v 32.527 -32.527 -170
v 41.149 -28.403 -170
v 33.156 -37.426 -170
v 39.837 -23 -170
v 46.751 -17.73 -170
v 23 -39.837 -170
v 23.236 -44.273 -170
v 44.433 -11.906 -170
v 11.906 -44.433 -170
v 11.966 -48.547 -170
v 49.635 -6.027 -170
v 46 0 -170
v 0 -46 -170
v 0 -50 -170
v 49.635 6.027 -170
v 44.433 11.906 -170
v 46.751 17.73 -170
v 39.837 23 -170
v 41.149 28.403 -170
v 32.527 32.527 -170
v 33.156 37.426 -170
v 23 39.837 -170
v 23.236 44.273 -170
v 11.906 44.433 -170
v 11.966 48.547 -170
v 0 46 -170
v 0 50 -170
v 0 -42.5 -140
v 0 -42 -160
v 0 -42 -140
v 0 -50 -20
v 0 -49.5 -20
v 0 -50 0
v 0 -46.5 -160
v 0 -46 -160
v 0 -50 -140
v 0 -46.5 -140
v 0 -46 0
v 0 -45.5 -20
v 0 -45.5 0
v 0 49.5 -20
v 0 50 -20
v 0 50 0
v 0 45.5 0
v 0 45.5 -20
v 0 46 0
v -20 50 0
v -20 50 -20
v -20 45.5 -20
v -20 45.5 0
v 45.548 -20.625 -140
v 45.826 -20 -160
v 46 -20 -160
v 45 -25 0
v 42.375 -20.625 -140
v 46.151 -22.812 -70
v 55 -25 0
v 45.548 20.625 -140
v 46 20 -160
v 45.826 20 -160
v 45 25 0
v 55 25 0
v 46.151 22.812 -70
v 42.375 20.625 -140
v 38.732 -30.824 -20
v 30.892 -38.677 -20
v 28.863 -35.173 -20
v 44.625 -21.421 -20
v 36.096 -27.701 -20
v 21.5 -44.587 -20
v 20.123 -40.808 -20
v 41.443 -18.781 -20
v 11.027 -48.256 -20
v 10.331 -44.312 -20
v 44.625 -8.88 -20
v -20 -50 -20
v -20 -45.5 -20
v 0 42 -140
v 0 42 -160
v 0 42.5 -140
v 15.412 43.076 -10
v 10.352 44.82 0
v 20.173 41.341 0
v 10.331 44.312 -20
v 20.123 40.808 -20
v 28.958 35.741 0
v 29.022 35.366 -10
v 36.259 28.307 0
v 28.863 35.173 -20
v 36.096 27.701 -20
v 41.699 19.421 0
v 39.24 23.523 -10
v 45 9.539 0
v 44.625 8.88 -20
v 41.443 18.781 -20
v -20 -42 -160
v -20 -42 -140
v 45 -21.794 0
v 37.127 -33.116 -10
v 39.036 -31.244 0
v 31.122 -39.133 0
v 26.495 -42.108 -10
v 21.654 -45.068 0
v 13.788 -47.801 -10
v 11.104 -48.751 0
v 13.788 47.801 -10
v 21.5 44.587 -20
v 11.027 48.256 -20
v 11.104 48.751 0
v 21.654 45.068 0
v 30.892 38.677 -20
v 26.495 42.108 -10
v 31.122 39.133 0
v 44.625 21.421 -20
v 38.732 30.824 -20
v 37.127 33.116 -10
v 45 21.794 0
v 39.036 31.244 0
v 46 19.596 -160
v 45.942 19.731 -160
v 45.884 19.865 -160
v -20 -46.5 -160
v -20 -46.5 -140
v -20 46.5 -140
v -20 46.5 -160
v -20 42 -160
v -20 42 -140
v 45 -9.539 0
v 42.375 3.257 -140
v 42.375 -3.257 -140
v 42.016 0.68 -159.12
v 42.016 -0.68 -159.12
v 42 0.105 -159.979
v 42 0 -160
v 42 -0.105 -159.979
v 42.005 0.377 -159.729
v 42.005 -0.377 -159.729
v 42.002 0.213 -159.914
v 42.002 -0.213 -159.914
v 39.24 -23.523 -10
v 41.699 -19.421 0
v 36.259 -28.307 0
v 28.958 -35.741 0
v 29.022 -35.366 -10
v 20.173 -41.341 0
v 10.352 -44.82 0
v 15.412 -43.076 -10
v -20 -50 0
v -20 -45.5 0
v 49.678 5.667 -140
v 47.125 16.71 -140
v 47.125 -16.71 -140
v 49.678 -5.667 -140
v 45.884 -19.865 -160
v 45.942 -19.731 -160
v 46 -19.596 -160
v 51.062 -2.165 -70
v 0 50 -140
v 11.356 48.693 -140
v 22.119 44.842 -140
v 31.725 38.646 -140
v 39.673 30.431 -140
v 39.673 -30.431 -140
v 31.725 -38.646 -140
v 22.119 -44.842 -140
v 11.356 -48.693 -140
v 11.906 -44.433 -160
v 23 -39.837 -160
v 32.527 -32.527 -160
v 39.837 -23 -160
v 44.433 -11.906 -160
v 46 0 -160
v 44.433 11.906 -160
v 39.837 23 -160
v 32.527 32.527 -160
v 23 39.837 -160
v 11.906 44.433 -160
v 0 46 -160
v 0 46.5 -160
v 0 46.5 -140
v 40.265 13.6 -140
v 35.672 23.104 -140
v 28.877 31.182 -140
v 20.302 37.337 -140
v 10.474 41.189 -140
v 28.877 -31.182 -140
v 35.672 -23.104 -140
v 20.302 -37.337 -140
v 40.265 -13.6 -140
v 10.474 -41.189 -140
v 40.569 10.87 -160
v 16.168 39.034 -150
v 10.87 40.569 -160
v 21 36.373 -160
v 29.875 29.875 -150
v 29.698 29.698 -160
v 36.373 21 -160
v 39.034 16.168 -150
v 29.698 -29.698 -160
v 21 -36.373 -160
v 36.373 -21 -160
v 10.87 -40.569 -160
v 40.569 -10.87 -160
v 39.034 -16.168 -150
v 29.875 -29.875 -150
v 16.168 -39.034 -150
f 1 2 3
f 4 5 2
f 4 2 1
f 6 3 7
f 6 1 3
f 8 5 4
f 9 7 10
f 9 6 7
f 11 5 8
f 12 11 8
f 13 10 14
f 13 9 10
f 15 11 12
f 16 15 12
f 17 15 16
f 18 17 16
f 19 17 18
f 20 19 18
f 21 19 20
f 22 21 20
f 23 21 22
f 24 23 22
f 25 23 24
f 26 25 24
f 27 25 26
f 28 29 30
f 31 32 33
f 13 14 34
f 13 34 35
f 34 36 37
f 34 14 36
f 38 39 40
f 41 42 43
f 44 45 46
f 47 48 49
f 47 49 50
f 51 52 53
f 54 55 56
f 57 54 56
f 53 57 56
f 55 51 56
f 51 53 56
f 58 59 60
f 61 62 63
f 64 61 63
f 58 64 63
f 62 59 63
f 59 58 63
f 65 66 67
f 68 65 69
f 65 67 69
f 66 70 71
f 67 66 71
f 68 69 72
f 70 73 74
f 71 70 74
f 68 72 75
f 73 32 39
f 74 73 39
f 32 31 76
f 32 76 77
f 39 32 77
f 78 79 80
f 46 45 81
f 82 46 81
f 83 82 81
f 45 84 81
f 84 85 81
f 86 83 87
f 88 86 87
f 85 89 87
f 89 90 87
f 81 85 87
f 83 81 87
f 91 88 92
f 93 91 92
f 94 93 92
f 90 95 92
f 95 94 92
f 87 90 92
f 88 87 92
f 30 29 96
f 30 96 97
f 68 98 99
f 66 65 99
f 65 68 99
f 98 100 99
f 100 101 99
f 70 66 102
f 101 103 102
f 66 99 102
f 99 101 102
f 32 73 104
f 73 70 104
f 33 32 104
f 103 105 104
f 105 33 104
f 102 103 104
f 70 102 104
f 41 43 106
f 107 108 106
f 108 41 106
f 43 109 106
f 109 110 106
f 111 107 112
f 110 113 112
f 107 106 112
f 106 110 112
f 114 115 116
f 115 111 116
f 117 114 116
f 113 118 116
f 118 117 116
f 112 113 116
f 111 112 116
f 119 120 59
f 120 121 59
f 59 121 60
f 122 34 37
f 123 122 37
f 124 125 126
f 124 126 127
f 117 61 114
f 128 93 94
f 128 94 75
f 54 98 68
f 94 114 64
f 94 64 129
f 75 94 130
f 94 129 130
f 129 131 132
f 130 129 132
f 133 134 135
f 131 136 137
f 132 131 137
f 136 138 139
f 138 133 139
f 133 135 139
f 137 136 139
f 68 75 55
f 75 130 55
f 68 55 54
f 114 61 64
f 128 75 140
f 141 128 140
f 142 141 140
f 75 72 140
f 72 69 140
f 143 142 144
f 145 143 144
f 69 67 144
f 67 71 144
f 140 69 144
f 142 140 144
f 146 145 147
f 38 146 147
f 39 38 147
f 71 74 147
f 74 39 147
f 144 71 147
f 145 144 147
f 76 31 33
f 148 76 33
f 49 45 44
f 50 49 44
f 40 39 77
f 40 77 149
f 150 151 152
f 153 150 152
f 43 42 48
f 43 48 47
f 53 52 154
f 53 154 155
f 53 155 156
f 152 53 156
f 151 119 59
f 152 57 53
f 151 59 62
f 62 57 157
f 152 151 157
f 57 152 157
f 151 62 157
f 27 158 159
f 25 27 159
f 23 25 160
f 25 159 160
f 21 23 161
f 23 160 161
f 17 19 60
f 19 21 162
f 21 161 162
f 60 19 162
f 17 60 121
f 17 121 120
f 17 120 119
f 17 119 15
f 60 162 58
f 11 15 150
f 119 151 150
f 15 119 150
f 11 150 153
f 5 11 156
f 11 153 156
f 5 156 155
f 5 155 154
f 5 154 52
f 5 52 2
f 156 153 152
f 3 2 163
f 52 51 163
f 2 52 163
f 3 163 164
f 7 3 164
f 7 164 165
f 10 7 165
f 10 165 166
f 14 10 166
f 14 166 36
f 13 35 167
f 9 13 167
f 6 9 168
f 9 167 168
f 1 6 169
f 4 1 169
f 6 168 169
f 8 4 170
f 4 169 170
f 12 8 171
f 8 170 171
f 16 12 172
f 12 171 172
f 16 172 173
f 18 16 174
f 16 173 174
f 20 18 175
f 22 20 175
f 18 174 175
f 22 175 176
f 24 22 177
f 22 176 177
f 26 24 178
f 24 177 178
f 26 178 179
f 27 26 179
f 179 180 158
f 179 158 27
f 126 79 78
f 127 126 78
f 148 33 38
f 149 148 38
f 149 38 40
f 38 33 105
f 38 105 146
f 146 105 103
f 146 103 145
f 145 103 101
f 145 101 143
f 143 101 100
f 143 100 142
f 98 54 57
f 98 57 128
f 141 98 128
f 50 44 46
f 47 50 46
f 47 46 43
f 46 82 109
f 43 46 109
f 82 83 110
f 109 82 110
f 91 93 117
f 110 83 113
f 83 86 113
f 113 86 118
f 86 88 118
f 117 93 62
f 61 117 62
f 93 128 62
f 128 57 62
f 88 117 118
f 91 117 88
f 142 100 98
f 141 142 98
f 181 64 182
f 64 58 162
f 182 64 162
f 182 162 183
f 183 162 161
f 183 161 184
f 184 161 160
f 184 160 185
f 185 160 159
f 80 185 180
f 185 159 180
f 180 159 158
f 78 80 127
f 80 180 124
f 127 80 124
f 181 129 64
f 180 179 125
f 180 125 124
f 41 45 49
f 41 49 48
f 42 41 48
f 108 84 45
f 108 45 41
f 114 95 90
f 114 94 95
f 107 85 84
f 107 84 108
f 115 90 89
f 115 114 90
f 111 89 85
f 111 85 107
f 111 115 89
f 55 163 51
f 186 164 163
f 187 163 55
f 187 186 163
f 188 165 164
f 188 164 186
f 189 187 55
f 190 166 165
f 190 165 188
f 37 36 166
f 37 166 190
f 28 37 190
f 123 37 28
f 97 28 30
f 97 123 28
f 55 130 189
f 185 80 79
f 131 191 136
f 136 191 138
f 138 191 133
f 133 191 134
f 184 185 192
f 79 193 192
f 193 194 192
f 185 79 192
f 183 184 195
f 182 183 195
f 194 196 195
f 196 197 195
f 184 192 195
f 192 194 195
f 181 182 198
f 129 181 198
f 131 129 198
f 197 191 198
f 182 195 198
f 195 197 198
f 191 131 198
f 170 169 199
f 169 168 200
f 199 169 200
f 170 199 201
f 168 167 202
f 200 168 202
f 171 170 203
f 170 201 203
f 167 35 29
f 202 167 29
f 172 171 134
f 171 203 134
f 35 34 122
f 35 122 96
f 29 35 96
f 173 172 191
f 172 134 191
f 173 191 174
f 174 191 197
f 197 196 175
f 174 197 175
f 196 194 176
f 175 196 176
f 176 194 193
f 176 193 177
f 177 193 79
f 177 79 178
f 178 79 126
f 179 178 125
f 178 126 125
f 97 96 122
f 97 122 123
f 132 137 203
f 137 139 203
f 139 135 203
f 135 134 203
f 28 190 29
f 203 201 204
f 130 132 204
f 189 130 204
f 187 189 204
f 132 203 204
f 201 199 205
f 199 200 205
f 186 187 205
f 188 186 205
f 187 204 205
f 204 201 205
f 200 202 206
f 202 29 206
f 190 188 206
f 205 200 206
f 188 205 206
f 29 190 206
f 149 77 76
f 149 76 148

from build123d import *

# Parameters (mm, degrees)
REVOLVE_1_ANGLE     = 180
SKETCH_2_W          = 120
SKETCH_2_H          = 124.466444362
CUT_EXTRUDE_1_DEPTH = 51
SKETCH_3_W          = 10
SKETCH_3_H          = 50
SKETCH_4_W          = 4
SKETCH_4_H          = 40
SKETCH_6_W          = 20
SKETCH_6_H          = 4.5
EXTRUDE_1_DEPTH     = 20
EXTRUDE_3_DEPTH     = 30


with BuildPart() as part:
    # 草图1 → 旋转1 (revolve)
    with BuildSketch(Plane(origin=(0, 0, 0), x_dir=(0, 0, -1), z_dir=(1, 0, 0))):
        Polygon((0, 50), (0, 46), (160, 42), (160, 46), align=None)
    revolve(axis=Axis((0, 0, 0), (0, 0, -1)), revolution_arc=REVOLVE_1_ANGLE)

    # 草图2 → 切除-拉伸1 (cut, through all)
    with BuildSketch(Plane(origin=(0, 0, 0), x_dir=(0, 0, -1), z_dir=(1, 0, 0))):
        with Locations((80, -2.118201403)):
            Rectangle(SKETCH_2_W, SKETCH_2_H)
    extrude(amount=CUT_EXTRUDE_1_DEPTH, mode=Mode.SUBTRACT)

    # 草图3 → 放样1 section 0
    with BuildSketch(Plane.XY):
        with Locations((50, 0)):
            Rectangle(SKETCH_3_W, SKETCH_3_H)
    # 草图4 → 放样1 section 1
    with BuildSketch(Plane(origin=(0, 0, -160), x_dir=(-1, 0, 0), z_dir=(0, 0, -1))):
        with Locations((-44, 0)):
            Rectangle(SKETCH_4_W, SKETCH_4_H)
    loft()

    # 草图6 → 凸台-拉伸1 (add)
    with BuildSketch(Plane.ZY):
        with Locations((-10, 47.75)):
            Rectangle(SKETCH_6_W, SKETCH_6_H)
        with Locations((-10, -47.75)):
            Rectangle(SKETCH_6_W, SKETCH_6_H)
        with Locations((-150, -44.25)):
            Rectangle(SKETCH_6_W, SKETCH_6_H)
        with Locations((-150, 44.25)):
            Rectangle(SKETCH_6_W, SKETCH_6_H)
    extrude(amount=EXTRUDE_1_DEPTH)

    # 草图8 → 凸台-拉伸3 (add)
    with BuildSketch(Plane.XY.offset(-140)):
        with BuildLine():
            Line((0, 46), (0, 50))
            ThreePointArc((0, 50), (50, 0), (0, -50))
            Line((0, -50), (0, -46))
            ThreePointArc((0, -46), (46, 0), (0, 46))
        make_face()
    extrude(amount=-EXTRUDE_3_DEPTH)


solid = part.part
